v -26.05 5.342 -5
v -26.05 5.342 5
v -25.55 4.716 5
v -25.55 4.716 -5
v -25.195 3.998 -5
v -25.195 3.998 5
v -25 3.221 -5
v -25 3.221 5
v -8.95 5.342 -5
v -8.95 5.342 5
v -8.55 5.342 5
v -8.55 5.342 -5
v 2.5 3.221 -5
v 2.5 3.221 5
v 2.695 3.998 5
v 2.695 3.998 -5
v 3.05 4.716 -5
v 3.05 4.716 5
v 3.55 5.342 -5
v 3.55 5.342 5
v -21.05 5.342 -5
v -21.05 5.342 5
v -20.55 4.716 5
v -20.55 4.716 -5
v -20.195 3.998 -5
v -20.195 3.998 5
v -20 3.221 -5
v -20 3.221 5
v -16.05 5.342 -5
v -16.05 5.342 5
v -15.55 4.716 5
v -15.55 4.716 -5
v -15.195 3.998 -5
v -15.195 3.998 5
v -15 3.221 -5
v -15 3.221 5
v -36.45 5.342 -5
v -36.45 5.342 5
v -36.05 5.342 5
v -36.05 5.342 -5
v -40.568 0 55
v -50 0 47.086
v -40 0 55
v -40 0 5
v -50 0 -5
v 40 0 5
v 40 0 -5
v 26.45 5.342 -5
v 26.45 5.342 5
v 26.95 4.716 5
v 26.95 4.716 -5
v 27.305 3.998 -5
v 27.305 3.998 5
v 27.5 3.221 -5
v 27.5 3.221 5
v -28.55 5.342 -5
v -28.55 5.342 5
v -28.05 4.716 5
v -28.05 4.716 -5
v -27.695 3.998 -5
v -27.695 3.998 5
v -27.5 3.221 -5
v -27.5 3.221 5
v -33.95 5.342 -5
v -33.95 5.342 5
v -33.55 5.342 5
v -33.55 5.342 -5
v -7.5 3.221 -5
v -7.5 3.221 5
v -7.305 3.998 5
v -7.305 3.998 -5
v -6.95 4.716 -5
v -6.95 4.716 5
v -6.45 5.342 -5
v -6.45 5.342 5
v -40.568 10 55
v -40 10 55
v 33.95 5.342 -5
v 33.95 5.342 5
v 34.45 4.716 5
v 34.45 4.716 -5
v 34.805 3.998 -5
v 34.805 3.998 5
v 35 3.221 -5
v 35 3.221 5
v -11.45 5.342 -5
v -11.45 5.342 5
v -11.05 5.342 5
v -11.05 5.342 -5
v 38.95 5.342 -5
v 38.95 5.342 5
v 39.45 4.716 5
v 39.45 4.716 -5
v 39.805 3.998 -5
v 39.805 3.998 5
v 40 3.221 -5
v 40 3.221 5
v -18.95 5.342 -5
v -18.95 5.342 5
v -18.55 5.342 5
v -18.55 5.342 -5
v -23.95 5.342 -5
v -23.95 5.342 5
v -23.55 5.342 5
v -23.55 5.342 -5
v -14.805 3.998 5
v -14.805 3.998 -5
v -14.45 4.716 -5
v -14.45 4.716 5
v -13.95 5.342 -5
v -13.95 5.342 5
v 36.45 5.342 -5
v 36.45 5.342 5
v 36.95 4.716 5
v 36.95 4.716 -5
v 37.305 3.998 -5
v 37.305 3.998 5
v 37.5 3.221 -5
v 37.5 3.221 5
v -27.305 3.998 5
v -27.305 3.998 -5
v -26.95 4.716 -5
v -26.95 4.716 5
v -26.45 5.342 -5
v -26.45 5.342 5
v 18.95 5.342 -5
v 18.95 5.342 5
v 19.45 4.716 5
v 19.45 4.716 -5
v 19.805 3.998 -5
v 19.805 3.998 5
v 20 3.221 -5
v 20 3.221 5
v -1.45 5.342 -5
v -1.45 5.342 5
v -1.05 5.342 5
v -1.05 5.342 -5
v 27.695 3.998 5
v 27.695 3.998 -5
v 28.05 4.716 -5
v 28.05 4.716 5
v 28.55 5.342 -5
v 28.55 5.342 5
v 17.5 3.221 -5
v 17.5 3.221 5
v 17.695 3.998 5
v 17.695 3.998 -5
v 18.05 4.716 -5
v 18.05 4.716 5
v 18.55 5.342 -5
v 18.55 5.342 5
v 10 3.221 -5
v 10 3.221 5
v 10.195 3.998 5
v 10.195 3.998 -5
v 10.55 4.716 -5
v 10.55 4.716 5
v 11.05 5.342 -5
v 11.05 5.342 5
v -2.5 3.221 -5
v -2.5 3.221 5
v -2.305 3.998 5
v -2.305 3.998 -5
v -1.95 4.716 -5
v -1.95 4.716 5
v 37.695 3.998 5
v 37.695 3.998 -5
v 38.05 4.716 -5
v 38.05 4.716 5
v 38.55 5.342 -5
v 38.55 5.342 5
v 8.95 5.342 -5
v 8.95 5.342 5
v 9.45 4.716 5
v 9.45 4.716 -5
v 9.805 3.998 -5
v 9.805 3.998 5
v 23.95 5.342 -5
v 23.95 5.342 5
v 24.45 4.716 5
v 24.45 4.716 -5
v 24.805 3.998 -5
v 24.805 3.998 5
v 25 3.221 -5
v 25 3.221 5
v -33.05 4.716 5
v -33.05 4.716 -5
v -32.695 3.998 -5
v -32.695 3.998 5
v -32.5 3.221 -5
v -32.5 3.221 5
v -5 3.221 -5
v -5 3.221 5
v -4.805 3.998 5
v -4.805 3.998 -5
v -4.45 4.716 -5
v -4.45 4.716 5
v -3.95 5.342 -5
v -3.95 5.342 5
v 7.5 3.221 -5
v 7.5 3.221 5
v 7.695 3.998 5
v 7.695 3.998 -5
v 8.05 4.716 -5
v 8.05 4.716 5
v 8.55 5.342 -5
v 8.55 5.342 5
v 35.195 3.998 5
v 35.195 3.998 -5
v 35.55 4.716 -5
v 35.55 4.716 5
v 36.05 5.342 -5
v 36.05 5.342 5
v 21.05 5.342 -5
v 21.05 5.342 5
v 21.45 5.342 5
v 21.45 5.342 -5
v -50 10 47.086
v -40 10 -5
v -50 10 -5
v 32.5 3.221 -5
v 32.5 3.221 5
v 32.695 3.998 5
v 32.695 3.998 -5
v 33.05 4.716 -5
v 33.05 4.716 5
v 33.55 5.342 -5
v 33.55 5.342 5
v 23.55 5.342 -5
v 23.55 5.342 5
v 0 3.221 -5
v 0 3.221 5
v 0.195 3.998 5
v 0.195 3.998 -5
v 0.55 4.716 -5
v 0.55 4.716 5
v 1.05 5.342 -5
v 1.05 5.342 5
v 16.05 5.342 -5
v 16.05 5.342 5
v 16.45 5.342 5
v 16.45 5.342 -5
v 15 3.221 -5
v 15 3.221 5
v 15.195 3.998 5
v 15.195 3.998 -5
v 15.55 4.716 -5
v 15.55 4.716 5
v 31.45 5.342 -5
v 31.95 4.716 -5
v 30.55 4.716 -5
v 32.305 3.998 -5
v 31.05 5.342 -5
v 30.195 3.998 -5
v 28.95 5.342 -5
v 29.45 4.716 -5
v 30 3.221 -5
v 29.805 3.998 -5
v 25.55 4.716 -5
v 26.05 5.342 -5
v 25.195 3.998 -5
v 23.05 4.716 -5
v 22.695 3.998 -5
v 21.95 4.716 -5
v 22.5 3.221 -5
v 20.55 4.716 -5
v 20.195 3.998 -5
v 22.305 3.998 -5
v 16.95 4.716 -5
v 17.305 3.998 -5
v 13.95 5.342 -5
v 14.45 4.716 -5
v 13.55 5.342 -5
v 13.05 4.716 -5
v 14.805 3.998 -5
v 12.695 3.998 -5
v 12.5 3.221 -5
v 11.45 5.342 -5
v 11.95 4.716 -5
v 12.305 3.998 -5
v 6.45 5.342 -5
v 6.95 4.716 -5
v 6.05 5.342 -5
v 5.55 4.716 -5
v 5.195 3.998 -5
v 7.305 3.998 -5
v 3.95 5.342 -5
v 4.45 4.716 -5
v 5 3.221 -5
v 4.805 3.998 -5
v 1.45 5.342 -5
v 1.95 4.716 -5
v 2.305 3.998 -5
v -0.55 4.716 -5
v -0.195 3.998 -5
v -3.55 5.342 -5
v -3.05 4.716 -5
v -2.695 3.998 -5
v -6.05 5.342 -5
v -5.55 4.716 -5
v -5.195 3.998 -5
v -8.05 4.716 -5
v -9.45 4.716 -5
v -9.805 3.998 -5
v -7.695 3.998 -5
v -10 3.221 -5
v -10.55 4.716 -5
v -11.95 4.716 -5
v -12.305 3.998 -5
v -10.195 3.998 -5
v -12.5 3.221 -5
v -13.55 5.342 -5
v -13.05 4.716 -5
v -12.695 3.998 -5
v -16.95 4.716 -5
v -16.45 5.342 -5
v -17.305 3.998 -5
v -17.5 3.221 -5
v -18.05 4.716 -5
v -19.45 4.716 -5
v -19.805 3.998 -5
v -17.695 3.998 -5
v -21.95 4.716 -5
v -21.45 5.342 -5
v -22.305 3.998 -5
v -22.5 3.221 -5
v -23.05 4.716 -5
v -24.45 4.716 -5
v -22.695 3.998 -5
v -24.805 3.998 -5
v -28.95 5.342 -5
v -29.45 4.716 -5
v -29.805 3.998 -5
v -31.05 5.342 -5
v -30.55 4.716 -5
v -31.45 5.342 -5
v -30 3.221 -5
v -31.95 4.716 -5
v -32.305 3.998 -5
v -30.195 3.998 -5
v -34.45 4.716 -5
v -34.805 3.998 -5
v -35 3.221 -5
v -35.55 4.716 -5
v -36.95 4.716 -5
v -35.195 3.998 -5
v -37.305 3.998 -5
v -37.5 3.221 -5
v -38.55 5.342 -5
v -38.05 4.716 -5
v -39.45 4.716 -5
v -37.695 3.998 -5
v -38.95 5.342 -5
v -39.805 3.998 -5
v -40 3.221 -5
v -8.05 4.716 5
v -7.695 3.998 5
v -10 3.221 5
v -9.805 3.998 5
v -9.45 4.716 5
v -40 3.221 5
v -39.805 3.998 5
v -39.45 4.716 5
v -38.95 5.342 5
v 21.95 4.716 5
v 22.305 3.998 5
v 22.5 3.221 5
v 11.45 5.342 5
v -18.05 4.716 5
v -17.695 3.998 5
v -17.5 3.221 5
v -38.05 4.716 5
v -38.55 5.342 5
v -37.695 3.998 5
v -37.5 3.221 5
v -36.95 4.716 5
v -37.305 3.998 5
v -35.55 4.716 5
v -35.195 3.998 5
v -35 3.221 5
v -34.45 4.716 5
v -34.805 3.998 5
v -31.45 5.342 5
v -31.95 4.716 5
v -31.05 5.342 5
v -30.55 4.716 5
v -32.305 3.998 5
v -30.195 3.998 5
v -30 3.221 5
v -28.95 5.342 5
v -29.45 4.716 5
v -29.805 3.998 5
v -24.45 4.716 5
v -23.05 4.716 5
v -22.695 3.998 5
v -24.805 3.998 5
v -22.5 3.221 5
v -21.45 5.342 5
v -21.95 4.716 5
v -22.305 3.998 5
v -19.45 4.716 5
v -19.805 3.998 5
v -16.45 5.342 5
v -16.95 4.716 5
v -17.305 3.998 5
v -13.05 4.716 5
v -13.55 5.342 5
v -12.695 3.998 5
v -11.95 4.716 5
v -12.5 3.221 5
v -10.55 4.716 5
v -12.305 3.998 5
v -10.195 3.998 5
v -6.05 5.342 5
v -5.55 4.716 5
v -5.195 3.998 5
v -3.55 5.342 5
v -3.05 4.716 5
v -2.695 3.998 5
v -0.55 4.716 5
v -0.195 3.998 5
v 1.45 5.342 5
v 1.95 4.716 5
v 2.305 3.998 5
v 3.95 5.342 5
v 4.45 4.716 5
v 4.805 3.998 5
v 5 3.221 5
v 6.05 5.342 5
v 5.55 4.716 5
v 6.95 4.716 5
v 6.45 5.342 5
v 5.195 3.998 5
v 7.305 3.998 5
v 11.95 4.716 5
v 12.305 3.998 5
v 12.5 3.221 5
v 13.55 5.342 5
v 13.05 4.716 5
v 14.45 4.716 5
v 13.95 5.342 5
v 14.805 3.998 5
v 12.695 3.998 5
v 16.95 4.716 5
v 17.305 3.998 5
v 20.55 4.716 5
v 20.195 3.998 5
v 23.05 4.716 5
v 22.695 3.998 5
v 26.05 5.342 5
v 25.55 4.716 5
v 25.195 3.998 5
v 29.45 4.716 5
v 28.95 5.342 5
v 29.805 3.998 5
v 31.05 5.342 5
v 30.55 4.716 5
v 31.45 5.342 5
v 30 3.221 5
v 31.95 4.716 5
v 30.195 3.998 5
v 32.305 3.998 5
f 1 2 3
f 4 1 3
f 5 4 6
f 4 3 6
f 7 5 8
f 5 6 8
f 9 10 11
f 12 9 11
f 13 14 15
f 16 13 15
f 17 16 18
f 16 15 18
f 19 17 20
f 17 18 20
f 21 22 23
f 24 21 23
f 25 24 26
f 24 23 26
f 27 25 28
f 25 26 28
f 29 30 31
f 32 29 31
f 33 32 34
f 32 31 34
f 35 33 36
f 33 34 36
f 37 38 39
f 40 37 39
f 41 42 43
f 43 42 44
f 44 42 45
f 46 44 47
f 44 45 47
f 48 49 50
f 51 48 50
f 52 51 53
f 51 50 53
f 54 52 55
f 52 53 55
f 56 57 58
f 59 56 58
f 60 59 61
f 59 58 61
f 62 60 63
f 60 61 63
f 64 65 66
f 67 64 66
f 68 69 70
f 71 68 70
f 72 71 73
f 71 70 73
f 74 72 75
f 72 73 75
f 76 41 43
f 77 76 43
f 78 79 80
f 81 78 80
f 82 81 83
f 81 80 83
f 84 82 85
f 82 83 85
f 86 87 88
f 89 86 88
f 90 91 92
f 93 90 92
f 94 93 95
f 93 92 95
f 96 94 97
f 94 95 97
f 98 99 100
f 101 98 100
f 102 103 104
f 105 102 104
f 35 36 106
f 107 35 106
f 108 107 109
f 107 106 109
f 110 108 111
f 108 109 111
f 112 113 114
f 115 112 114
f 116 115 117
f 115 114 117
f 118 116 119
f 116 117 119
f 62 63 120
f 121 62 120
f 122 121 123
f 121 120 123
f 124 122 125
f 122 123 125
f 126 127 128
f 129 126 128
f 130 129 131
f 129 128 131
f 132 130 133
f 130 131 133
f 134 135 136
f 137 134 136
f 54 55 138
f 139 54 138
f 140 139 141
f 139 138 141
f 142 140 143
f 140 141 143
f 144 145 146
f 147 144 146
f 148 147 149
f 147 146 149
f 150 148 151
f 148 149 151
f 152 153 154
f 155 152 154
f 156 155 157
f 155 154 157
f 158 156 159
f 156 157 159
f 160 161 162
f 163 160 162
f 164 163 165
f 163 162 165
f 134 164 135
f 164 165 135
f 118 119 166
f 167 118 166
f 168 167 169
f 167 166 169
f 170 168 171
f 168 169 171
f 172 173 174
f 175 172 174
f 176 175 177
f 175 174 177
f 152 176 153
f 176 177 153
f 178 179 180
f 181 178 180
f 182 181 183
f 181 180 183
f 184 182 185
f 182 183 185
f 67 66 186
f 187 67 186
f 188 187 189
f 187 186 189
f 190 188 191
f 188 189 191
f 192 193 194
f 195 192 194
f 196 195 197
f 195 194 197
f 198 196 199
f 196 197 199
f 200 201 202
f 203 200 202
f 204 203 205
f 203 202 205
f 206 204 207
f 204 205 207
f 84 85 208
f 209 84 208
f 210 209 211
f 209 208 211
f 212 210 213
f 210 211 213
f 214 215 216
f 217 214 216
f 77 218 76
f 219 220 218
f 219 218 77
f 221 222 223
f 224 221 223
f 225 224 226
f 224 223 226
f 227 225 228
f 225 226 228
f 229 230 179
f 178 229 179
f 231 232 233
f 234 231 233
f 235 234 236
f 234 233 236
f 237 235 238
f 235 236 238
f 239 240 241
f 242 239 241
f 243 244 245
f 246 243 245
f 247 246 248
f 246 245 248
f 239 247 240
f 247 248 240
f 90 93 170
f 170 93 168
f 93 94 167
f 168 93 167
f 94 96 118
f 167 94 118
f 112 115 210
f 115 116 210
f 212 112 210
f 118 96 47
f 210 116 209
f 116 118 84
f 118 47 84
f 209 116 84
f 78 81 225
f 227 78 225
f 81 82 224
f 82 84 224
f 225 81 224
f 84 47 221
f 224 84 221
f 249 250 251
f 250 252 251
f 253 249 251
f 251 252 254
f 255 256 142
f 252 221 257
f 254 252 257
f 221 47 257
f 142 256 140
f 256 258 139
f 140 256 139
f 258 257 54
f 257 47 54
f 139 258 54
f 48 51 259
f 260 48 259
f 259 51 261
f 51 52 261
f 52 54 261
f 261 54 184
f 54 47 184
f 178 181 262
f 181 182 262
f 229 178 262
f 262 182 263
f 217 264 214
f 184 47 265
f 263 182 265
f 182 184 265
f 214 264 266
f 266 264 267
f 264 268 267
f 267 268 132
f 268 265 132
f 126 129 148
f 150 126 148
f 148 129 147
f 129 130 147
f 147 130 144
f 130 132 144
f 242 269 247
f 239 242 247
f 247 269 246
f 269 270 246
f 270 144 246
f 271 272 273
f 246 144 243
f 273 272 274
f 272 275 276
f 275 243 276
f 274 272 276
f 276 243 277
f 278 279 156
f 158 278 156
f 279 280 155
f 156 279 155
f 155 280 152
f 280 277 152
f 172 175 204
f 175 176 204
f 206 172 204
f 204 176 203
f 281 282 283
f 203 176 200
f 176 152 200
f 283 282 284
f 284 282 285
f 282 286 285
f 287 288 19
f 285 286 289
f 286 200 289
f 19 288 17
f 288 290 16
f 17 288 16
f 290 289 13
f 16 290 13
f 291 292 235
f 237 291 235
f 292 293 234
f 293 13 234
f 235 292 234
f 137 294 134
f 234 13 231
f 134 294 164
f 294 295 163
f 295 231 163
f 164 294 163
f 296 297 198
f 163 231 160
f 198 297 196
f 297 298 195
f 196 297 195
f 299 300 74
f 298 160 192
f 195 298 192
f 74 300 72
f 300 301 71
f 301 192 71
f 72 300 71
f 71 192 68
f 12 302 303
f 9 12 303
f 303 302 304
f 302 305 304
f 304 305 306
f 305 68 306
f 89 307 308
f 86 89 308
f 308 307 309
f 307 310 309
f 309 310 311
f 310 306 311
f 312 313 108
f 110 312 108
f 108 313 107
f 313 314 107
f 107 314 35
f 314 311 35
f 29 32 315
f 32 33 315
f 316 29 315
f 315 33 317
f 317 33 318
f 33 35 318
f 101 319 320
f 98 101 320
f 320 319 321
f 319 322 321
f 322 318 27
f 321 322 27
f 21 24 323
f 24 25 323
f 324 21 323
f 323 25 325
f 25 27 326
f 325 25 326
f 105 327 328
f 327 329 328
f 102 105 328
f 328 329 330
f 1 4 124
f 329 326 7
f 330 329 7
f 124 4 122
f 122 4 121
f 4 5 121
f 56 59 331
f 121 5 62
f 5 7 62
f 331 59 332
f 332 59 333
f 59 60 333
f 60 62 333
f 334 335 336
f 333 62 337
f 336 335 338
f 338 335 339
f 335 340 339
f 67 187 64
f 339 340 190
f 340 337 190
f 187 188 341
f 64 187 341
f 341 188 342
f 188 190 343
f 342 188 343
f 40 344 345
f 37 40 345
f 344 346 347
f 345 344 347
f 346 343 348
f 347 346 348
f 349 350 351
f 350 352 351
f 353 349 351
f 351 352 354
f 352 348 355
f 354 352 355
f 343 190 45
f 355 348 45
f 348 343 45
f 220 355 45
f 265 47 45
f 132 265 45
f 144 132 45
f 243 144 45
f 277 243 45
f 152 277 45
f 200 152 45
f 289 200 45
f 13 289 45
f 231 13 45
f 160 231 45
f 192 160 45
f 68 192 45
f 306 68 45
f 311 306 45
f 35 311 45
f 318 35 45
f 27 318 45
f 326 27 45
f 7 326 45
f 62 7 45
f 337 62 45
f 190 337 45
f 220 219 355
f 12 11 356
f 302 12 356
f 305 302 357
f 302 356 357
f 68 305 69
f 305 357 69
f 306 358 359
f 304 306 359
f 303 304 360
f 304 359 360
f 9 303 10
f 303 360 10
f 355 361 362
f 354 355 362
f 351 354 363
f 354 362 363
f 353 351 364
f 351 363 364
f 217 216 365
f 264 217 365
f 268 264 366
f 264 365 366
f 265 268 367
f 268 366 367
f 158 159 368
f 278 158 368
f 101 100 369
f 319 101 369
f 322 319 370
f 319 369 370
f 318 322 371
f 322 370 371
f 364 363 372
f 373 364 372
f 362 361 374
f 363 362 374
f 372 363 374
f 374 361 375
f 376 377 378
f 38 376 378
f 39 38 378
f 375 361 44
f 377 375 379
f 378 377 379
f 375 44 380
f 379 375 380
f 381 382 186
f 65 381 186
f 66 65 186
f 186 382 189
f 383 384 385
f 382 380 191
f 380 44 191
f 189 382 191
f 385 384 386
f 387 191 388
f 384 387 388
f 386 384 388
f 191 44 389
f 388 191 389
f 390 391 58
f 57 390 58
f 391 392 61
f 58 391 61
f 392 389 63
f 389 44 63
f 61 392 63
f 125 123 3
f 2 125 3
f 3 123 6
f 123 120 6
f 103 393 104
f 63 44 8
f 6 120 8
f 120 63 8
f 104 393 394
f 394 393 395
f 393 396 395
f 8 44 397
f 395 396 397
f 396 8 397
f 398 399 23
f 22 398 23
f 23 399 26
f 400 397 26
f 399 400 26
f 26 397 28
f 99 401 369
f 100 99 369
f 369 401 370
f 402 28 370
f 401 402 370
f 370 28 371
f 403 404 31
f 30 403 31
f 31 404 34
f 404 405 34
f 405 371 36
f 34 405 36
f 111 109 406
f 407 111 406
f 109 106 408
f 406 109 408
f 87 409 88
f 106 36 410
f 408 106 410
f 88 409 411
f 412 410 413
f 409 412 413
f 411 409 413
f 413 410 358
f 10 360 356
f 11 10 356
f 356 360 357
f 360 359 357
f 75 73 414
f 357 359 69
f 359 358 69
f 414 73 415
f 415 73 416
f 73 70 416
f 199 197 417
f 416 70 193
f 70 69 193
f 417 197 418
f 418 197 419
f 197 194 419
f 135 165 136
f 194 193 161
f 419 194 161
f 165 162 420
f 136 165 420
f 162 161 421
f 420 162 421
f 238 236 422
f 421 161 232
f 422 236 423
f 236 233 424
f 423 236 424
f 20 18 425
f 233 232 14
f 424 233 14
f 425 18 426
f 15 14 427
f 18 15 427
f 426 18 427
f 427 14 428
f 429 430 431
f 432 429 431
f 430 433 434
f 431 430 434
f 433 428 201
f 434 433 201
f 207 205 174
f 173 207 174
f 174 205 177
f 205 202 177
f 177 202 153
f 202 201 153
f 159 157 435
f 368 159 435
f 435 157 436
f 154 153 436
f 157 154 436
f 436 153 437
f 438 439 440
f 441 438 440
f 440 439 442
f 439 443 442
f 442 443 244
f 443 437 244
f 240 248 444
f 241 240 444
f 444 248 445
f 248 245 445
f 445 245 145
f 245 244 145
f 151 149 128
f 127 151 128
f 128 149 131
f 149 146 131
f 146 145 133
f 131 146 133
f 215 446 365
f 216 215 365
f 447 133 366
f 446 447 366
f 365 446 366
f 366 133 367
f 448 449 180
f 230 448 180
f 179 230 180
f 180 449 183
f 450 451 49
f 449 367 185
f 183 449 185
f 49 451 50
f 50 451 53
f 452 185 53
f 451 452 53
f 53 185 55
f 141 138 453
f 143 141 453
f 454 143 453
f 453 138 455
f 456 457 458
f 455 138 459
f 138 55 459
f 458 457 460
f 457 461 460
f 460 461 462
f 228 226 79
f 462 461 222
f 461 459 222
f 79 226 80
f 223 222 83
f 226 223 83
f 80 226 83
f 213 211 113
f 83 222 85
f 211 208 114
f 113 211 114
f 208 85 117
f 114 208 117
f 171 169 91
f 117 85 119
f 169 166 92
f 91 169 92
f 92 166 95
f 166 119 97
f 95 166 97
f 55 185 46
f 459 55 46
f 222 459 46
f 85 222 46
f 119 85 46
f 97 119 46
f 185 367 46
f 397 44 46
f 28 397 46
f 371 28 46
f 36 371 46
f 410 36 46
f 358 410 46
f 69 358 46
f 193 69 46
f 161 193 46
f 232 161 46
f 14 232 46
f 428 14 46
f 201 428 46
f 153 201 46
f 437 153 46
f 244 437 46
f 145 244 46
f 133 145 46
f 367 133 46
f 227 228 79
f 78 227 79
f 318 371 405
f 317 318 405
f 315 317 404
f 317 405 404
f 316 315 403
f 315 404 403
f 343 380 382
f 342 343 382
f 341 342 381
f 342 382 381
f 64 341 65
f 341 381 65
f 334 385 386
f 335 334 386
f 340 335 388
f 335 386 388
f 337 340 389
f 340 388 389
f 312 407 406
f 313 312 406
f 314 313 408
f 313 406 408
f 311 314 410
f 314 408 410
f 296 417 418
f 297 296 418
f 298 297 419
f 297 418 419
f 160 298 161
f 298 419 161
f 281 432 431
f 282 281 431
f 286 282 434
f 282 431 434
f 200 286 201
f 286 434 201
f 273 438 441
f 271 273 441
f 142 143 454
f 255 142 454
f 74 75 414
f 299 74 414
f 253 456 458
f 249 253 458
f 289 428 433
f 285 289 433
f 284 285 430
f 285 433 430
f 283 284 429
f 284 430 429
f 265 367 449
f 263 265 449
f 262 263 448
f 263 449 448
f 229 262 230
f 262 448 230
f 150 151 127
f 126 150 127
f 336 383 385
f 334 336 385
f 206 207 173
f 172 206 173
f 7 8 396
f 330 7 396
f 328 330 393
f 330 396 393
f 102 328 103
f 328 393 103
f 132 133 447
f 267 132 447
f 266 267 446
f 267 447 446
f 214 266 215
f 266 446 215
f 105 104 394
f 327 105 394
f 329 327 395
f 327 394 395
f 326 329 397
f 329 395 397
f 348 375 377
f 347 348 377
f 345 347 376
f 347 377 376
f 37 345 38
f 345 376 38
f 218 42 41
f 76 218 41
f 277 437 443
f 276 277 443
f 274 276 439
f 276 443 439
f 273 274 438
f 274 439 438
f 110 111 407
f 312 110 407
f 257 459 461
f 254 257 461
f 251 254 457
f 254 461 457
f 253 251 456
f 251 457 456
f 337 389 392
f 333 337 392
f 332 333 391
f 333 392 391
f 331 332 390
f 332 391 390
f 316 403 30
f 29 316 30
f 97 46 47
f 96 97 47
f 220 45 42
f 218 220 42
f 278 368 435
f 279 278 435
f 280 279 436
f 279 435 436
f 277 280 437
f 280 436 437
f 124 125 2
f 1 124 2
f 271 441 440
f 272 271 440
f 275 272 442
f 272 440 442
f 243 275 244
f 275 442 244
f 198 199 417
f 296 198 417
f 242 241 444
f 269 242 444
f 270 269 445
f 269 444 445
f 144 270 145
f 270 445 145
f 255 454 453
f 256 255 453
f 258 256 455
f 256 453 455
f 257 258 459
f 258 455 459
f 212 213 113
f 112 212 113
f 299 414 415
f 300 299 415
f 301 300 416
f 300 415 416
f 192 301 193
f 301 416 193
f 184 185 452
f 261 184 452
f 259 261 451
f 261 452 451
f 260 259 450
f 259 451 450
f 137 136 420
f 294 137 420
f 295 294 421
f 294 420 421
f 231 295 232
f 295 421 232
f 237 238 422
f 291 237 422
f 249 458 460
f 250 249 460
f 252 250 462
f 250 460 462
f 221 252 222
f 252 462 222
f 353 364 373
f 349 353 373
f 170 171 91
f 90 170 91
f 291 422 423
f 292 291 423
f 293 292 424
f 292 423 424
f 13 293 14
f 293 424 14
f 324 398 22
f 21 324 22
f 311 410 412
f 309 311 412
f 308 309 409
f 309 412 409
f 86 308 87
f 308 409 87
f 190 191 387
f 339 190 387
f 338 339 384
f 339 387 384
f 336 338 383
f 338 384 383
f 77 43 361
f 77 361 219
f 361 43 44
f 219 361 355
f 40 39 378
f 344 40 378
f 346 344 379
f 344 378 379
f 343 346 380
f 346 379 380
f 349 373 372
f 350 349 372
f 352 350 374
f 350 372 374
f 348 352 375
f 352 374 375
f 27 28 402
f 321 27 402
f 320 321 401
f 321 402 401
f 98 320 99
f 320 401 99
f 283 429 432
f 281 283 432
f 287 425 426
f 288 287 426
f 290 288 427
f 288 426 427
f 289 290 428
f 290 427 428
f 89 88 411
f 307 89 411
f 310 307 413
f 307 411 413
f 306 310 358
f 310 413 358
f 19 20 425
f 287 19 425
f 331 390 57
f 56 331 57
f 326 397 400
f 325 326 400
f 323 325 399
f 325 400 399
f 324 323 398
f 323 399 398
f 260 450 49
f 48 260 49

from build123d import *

# Parameters (mm, degrees)
BOSS_EXTRUDE1_DEPTH = 10
CUT_EXTRUDE4_DEPTH  = 10
LPATTERN2_COUNT     = 32
LPATTERN2_PITCH     = 2.5


with BuildPart() as part:
    # Sketch1 → Boss-Extrude1 (new body)
    with BuildSketch(Plane(origin=(0, 0, 0), x_dir=(1, 0, 0), z_dir=(0, 1, 0))):
        Polygon((-50, -47.085841971), (-40.568273737, -55), (-40, -55), (-40, -5), (40, -5), (40, 5), (-40, 5), (-50, 5), align=None)
    extrude(amount=BOSS_EXTRUDE1_DEPTH)

    # Sketch5 → Cut-Extrude4 (cut)
    with BuildSketch(Plane.XY.offset(5)):
        with BuildLine():
            Line((40, 10), (37.5, 10))
            Line((37.5, 10), (37.5, 3.221403126))
            ThreePointArc((37.5, 3.221403126), (37.853347708, 4.366700719), (38.55, 5.342014394))
            Line((38.55, 5.342014394), (38.95, 5.342014394))
            ThreePointArc((38.95, 5.342014394), (39.646652292, 4.366700719), (40, 3.221403126))
            Line((40, 3.221403126), (40, 10))
        make_face()
    cut_extrude4 = extrude(amount=-CUT_EXTRUDE4_DEPTH, mode=Mode.SUBTRACT)

    # LPattern2: Cut-Extrude4 ×32
    with Locations(*[(-i * LPATTERN2_PITCH, 0, 0) for i in range(1, LPATTERN2_COUNT)]):
        add(cut_extrude4, mode=Mode.SUBTRACT)


solid = part.part
